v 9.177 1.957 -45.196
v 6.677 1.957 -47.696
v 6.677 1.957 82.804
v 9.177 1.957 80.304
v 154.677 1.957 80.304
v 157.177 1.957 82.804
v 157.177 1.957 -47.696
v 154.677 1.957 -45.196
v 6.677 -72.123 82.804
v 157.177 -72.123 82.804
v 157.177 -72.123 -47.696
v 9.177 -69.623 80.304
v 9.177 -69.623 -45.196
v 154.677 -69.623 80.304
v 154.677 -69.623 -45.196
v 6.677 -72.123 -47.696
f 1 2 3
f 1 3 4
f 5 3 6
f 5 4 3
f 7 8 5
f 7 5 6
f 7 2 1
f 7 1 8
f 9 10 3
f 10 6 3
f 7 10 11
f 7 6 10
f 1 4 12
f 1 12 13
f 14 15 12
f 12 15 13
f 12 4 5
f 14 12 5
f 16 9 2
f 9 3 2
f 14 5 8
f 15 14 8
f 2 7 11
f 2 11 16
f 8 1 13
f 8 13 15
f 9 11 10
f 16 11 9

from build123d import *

# Parameters (mm, degrees)
SKETCH1_W           = 150.5
SKETCH1_H           = 130.5
SKETCH1_W_2         = 145.5
SKETCH1_H_2         = 125.5
BOSS_EXTRUDE1_DEPTH = 71.58
SKETCH3_W           = 150.5
SKETCH3_H           = 130.5
BOSS_EXTRUDE2_DEPTH = 2.5


with BuildPart() as part:
    # Sketch1 → Boss-Extrude1 (new body)
    with BuildSketch(Plane(origin=(0, 1.956589097, 0), x_dir=(1, 0, 0), z_dir=(0, 1, 0))):
        with Locations((81.927421255, -17.554481305)):
            Rectangle(SKETCH1_W, SKETCH1_H)
        with Locations((81.927421255, -17.554481305)):
            Rectangle(SKETCH1_W_2, SKETCH1_H_2, mode=Mode.SUBTRACT)
    extrude(amount=-BOSS_EXTRUDE1_DEPTH)

    # Sketch3 → Boss-Extrude2 (add)
    with BuildSketch(Plane(origin=(0, -69.623410903, 0), x_dir=(-1, 0, 0), z_dir=(0, -1, 0))):
        with Locations((-81.927421255, -17.554481305)):
            Rectangle(SKETCH3_W, SKETCH3_H)
    extrude(amount=BOSS_EXTRUDE2_DEPTH)


solid = part.part
